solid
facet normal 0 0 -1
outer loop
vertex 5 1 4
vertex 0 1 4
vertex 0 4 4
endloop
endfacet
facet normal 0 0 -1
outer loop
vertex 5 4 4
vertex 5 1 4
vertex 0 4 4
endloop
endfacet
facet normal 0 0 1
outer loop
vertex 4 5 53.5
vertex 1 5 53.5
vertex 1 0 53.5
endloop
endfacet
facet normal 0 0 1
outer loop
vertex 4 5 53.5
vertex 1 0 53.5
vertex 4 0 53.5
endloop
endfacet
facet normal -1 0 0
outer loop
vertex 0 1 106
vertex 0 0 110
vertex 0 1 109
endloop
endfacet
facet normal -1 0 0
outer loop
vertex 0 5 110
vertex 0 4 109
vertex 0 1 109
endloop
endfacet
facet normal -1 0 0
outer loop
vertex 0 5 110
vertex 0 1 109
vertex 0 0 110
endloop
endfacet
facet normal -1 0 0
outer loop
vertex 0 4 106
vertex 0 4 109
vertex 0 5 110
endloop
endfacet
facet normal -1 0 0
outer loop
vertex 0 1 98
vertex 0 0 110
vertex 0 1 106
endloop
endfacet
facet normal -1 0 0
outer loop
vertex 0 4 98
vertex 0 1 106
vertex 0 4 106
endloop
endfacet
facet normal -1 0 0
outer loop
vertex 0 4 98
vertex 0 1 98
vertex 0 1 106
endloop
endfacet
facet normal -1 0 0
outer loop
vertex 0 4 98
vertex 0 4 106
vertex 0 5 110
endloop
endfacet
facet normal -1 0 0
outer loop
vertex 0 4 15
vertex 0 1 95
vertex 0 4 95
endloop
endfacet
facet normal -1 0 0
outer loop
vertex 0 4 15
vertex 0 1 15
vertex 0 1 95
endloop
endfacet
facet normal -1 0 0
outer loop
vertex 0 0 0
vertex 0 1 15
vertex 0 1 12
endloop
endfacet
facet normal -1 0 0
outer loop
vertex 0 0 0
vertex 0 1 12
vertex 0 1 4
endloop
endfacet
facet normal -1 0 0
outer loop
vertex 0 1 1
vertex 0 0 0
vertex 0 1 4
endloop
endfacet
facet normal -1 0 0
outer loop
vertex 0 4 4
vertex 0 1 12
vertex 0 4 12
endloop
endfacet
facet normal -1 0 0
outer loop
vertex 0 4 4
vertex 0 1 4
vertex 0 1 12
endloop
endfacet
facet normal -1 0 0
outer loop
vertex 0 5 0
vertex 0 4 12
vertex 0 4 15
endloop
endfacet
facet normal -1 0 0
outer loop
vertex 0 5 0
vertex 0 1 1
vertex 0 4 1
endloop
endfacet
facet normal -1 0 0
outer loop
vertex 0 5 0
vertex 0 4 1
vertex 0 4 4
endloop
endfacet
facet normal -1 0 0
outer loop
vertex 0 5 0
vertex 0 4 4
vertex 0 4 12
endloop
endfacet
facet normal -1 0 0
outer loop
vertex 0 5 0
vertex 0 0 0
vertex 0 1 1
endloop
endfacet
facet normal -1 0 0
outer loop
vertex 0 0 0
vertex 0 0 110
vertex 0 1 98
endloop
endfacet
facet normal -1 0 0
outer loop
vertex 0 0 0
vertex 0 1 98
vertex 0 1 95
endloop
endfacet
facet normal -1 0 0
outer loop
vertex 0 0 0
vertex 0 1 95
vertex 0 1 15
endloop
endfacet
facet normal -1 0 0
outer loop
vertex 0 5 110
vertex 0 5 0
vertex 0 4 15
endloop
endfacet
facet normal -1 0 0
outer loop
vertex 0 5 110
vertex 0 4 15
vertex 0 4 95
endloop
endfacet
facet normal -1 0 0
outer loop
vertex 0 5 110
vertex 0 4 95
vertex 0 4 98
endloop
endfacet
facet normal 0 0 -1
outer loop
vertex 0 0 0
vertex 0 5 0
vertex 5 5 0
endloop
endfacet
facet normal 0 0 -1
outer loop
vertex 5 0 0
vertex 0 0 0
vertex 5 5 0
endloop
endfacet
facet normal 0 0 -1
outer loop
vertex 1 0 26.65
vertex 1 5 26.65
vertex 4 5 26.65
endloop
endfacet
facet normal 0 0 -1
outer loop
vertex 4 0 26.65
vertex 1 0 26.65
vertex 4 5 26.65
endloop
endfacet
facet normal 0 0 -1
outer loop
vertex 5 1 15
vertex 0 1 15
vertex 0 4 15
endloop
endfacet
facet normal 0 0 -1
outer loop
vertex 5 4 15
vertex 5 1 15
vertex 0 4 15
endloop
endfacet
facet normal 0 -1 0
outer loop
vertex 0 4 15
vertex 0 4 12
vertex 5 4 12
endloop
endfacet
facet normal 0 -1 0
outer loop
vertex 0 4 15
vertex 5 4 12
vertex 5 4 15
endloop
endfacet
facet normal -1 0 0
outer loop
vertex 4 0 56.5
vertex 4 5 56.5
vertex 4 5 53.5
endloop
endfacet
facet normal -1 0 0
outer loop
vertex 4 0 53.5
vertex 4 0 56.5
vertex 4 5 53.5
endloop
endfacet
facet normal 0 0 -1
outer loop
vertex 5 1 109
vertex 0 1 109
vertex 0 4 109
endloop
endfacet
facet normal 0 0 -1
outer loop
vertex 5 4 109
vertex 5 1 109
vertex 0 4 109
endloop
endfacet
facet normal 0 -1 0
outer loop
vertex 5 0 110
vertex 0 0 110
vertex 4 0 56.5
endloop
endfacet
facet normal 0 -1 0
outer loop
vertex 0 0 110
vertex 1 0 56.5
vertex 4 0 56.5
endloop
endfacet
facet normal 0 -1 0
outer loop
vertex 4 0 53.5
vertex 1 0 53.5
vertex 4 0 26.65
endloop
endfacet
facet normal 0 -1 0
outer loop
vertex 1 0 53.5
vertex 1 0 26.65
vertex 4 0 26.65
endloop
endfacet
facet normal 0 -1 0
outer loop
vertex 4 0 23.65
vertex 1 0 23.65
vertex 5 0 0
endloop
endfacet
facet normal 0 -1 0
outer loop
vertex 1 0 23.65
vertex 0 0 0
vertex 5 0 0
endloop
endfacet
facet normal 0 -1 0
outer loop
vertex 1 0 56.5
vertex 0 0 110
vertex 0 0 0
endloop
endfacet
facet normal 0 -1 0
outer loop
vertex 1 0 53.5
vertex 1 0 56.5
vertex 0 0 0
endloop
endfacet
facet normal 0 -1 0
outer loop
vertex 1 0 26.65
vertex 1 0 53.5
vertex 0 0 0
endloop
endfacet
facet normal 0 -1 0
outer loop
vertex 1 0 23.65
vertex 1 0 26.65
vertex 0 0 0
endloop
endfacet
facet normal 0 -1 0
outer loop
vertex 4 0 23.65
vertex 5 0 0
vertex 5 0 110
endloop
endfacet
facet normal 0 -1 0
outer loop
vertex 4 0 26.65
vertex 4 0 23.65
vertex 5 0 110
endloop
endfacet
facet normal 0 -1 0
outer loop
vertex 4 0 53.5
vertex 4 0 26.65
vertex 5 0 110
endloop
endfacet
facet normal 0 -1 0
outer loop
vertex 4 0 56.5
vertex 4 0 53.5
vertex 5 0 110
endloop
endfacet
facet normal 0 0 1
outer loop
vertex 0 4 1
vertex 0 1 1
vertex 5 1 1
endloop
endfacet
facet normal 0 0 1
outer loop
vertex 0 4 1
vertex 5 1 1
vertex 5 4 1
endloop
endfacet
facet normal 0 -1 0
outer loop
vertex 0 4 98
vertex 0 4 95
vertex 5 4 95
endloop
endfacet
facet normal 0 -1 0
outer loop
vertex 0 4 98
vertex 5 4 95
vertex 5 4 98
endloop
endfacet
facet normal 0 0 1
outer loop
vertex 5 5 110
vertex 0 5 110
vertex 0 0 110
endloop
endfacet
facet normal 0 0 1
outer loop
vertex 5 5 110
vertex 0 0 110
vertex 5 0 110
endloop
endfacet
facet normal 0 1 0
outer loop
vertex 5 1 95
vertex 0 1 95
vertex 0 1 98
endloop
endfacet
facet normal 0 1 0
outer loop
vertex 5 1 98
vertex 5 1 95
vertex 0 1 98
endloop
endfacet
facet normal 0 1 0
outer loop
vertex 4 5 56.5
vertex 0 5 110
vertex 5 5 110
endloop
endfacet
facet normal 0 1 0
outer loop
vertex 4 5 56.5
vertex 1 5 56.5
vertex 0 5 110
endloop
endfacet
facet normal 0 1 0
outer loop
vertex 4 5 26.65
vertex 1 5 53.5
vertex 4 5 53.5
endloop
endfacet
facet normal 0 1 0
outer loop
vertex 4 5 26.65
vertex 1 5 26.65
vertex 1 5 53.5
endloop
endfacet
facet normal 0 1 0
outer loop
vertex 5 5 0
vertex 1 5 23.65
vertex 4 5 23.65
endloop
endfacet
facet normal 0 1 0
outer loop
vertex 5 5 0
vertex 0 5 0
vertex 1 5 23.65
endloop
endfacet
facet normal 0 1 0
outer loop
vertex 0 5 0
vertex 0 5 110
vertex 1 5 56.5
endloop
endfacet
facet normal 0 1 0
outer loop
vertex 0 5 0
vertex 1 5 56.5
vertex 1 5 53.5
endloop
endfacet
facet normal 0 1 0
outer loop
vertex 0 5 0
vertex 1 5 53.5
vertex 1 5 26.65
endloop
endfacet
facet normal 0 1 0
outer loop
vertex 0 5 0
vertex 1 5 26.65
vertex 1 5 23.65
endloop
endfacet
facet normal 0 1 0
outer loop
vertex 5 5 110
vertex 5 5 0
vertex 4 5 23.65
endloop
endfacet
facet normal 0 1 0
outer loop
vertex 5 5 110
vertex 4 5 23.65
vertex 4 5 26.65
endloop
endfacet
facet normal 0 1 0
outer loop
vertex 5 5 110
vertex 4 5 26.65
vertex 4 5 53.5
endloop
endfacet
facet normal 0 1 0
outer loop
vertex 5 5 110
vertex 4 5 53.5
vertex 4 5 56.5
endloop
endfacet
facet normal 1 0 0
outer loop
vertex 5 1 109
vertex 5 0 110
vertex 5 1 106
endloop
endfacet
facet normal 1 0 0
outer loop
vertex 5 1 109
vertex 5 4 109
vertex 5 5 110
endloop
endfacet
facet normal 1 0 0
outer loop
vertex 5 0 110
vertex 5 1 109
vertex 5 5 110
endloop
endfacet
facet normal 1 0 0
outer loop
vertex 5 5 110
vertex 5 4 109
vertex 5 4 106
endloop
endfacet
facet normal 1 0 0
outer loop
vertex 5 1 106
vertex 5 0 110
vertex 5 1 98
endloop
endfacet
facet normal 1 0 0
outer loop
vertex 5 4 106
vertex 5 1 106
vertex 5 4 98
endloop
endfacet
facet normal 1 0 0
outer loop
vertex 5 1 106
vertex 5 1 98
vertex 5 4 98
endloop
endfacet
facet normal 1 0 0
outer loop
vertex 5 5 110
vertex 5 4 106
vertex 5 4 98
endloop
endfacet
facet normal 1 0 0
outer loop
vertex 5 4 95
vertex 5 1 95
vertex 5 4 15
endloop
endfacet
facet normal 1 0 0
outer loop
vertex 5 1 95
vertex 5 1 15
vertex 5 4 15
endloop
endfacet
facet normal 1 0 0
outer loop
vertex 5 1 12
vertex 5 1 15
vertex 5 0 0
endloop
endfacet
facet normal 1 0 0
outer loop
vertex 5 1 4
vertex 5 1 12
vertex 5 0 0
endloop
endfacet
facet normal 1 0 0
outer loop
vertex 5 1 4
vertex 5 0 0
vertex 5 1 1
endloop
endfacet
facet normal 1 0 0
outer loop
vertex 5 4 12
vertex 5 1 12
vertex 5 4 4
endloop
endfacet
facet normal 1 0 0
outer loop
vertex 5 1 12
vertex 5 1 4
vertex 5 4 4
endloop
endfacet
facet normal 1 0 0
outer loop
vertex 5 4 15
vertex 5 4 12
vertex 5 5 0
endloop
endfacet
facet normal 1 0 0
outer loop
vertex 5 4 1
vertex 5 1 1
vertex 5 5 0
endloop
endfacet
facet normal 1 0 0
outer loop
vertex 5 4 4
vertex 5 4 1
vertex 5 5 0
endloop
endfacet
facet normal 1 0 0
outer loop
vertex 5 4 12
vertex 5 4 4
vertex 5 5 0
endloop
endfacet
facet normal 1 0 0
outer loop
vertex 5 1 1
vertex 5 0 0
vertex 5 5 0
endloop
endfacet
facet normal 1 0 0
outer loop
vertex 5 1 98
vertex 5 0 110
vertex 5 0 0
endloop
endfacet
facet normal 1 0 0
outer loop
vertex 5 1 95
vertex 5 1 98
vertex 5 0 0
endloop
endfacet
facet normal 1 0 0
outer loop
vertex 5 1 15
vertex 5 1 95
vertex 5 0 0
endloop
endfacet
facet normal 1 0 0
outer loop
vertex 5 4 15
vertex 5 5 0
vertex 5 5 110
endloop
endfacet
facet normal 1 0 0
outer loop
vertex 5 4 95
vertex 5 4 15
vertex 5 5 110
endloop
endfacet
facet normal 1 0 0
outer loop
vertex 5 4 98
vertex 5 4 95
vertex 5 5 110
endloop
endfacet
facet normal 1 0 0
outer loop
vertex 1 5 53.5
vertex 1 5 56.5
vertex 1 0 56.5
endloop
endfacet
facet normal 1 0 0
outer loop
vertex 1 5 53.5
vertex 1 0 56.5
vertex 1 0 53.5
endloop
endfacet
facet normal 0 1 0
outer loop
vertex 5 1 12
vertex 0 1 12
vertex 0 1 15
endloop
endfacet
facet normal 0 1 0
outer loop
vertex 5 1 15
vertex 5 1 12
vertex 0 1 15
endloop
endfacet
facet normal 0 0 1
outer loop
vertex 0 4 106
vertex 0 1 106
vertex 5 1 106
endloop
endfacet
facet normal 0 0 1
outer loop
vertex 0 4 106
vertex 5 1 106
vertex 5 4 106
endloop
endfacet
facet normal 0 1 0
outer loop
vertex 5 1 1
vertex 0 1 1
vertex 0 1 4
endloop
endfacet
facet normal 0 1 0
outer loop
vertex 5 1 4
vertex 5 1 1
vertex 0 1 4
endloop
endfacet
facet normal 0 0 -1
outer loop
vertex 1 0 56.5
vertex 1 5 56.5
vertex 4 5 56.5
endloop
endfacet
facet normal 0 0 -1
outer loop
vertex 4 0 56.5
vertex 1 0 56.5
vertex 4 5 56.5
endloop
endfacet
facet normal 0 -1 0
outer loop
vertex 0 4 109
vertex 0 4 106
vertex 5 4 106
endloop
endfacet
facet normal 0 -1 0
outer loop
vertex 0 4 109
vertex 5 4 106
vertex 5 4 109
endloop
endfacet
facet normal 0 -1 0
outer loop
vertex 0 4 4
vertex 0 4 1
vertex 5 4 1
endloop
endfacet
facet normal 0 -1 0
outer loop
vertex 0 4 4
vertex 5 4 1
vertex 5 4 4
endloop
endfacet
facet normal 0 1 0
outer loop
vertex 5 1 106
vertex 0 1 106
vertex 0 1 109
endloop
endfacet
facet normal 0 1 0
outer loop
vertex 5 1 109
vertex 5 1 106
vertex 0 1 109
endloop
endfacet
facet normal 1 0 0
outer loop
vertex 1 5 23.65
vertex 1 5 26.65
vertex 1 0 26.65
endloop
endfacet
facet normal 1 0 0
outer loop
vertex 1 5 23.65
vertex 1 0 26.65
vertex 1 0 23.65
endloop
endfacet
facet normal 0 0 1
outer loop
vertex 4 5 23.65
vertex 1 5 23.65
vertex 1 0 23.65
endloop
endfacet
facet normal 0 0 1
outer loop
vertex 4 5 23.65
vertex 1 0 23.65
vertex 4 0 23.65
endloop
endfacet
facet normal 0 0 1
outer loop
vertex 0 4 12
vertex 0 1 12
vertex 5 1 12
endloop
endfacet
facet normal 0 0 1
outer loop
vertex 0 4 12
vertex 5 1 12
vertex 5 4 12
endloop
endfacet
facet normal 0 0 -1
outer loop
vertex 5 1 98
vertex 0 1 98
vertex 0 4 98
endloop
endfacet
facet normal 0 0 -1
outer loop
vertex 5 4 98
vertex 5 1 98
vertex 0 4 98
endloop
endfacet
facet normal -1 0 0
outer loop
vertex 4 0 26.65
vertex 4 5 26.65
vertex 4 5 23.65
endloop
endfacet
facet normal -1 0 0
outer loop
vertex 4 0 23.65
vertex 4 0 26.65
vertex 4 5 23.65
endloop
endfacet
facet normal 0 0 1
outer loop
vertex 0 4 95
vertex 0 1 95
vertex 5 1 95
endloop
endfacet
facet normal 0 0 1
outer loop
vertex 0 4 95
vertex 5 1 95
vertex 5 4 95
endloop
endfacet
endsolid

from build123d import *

# Parameters (mm, degrees)
SKETCH1_W           = 5
SKETCH1_H           = 5
BOSS_EXTRUDE1_DEPTH = 110
SKETCH2_W           = 3
SKETCH2_H           = 3
CUT_EXTRUDE1_DEPTH  = 9
SKETCH3_W           = 3
SKETCH3_H           = 3
CUT_EXTRUDE2_DEPTH  = 9


with BuildPart() as part:
    # Sketch1 → Boss-Extrude1 (new body)
    with BuildSketch(Plane.XY):
        with Locations((2.5, 2.5)):
            Rectangle(SKETCH1_W, SKETCH1_H)
    extrude(amount=BOSS_EXTRUDE1_DEPTH)

    # Sketch2 → Cut-Extrude1 (cut)
    with BuildSketch(Plane.ZY):
        with Locations((2.5, 2.5)):
            Rectangle(SKETCH2_W, SKETCH2_H)
        with Locations((107.5, 2.5)):
            Rectangle(SKETCH2_W, SKETCH2_H)
        with Locations((13.5, 2.5)):
            Rectangle(SKETCH2_W, SKETCH2_H)
        with Locations((96.5, 2.5)):
            Rectangle(SKETCH2_W, SKETCH2_H)
    extrude(amount=-CUT_EXTRUDE1_DEPTH, mode=Mode.SUBTRACT)

    # Sketch3 → Cut-Extrude2 (cut)
    with BuildSketch(Plane(origin=(0, 5, 0), x_dir=(1, 0, 0), z_dir=(0, 1, 0))):
        with Locations((2.5, -25.15)):
            Rectangle(SKETCH3_W, SKETCH3_H)
        with Locations((2.5, -55)):
            Rectangle(SKETCH3_W, SKETCH3_H)
    extrude(amount=-CUT_EXTRUDE2_DEPTH, mode=Mode.SUBTRACT)


solid = part.part
